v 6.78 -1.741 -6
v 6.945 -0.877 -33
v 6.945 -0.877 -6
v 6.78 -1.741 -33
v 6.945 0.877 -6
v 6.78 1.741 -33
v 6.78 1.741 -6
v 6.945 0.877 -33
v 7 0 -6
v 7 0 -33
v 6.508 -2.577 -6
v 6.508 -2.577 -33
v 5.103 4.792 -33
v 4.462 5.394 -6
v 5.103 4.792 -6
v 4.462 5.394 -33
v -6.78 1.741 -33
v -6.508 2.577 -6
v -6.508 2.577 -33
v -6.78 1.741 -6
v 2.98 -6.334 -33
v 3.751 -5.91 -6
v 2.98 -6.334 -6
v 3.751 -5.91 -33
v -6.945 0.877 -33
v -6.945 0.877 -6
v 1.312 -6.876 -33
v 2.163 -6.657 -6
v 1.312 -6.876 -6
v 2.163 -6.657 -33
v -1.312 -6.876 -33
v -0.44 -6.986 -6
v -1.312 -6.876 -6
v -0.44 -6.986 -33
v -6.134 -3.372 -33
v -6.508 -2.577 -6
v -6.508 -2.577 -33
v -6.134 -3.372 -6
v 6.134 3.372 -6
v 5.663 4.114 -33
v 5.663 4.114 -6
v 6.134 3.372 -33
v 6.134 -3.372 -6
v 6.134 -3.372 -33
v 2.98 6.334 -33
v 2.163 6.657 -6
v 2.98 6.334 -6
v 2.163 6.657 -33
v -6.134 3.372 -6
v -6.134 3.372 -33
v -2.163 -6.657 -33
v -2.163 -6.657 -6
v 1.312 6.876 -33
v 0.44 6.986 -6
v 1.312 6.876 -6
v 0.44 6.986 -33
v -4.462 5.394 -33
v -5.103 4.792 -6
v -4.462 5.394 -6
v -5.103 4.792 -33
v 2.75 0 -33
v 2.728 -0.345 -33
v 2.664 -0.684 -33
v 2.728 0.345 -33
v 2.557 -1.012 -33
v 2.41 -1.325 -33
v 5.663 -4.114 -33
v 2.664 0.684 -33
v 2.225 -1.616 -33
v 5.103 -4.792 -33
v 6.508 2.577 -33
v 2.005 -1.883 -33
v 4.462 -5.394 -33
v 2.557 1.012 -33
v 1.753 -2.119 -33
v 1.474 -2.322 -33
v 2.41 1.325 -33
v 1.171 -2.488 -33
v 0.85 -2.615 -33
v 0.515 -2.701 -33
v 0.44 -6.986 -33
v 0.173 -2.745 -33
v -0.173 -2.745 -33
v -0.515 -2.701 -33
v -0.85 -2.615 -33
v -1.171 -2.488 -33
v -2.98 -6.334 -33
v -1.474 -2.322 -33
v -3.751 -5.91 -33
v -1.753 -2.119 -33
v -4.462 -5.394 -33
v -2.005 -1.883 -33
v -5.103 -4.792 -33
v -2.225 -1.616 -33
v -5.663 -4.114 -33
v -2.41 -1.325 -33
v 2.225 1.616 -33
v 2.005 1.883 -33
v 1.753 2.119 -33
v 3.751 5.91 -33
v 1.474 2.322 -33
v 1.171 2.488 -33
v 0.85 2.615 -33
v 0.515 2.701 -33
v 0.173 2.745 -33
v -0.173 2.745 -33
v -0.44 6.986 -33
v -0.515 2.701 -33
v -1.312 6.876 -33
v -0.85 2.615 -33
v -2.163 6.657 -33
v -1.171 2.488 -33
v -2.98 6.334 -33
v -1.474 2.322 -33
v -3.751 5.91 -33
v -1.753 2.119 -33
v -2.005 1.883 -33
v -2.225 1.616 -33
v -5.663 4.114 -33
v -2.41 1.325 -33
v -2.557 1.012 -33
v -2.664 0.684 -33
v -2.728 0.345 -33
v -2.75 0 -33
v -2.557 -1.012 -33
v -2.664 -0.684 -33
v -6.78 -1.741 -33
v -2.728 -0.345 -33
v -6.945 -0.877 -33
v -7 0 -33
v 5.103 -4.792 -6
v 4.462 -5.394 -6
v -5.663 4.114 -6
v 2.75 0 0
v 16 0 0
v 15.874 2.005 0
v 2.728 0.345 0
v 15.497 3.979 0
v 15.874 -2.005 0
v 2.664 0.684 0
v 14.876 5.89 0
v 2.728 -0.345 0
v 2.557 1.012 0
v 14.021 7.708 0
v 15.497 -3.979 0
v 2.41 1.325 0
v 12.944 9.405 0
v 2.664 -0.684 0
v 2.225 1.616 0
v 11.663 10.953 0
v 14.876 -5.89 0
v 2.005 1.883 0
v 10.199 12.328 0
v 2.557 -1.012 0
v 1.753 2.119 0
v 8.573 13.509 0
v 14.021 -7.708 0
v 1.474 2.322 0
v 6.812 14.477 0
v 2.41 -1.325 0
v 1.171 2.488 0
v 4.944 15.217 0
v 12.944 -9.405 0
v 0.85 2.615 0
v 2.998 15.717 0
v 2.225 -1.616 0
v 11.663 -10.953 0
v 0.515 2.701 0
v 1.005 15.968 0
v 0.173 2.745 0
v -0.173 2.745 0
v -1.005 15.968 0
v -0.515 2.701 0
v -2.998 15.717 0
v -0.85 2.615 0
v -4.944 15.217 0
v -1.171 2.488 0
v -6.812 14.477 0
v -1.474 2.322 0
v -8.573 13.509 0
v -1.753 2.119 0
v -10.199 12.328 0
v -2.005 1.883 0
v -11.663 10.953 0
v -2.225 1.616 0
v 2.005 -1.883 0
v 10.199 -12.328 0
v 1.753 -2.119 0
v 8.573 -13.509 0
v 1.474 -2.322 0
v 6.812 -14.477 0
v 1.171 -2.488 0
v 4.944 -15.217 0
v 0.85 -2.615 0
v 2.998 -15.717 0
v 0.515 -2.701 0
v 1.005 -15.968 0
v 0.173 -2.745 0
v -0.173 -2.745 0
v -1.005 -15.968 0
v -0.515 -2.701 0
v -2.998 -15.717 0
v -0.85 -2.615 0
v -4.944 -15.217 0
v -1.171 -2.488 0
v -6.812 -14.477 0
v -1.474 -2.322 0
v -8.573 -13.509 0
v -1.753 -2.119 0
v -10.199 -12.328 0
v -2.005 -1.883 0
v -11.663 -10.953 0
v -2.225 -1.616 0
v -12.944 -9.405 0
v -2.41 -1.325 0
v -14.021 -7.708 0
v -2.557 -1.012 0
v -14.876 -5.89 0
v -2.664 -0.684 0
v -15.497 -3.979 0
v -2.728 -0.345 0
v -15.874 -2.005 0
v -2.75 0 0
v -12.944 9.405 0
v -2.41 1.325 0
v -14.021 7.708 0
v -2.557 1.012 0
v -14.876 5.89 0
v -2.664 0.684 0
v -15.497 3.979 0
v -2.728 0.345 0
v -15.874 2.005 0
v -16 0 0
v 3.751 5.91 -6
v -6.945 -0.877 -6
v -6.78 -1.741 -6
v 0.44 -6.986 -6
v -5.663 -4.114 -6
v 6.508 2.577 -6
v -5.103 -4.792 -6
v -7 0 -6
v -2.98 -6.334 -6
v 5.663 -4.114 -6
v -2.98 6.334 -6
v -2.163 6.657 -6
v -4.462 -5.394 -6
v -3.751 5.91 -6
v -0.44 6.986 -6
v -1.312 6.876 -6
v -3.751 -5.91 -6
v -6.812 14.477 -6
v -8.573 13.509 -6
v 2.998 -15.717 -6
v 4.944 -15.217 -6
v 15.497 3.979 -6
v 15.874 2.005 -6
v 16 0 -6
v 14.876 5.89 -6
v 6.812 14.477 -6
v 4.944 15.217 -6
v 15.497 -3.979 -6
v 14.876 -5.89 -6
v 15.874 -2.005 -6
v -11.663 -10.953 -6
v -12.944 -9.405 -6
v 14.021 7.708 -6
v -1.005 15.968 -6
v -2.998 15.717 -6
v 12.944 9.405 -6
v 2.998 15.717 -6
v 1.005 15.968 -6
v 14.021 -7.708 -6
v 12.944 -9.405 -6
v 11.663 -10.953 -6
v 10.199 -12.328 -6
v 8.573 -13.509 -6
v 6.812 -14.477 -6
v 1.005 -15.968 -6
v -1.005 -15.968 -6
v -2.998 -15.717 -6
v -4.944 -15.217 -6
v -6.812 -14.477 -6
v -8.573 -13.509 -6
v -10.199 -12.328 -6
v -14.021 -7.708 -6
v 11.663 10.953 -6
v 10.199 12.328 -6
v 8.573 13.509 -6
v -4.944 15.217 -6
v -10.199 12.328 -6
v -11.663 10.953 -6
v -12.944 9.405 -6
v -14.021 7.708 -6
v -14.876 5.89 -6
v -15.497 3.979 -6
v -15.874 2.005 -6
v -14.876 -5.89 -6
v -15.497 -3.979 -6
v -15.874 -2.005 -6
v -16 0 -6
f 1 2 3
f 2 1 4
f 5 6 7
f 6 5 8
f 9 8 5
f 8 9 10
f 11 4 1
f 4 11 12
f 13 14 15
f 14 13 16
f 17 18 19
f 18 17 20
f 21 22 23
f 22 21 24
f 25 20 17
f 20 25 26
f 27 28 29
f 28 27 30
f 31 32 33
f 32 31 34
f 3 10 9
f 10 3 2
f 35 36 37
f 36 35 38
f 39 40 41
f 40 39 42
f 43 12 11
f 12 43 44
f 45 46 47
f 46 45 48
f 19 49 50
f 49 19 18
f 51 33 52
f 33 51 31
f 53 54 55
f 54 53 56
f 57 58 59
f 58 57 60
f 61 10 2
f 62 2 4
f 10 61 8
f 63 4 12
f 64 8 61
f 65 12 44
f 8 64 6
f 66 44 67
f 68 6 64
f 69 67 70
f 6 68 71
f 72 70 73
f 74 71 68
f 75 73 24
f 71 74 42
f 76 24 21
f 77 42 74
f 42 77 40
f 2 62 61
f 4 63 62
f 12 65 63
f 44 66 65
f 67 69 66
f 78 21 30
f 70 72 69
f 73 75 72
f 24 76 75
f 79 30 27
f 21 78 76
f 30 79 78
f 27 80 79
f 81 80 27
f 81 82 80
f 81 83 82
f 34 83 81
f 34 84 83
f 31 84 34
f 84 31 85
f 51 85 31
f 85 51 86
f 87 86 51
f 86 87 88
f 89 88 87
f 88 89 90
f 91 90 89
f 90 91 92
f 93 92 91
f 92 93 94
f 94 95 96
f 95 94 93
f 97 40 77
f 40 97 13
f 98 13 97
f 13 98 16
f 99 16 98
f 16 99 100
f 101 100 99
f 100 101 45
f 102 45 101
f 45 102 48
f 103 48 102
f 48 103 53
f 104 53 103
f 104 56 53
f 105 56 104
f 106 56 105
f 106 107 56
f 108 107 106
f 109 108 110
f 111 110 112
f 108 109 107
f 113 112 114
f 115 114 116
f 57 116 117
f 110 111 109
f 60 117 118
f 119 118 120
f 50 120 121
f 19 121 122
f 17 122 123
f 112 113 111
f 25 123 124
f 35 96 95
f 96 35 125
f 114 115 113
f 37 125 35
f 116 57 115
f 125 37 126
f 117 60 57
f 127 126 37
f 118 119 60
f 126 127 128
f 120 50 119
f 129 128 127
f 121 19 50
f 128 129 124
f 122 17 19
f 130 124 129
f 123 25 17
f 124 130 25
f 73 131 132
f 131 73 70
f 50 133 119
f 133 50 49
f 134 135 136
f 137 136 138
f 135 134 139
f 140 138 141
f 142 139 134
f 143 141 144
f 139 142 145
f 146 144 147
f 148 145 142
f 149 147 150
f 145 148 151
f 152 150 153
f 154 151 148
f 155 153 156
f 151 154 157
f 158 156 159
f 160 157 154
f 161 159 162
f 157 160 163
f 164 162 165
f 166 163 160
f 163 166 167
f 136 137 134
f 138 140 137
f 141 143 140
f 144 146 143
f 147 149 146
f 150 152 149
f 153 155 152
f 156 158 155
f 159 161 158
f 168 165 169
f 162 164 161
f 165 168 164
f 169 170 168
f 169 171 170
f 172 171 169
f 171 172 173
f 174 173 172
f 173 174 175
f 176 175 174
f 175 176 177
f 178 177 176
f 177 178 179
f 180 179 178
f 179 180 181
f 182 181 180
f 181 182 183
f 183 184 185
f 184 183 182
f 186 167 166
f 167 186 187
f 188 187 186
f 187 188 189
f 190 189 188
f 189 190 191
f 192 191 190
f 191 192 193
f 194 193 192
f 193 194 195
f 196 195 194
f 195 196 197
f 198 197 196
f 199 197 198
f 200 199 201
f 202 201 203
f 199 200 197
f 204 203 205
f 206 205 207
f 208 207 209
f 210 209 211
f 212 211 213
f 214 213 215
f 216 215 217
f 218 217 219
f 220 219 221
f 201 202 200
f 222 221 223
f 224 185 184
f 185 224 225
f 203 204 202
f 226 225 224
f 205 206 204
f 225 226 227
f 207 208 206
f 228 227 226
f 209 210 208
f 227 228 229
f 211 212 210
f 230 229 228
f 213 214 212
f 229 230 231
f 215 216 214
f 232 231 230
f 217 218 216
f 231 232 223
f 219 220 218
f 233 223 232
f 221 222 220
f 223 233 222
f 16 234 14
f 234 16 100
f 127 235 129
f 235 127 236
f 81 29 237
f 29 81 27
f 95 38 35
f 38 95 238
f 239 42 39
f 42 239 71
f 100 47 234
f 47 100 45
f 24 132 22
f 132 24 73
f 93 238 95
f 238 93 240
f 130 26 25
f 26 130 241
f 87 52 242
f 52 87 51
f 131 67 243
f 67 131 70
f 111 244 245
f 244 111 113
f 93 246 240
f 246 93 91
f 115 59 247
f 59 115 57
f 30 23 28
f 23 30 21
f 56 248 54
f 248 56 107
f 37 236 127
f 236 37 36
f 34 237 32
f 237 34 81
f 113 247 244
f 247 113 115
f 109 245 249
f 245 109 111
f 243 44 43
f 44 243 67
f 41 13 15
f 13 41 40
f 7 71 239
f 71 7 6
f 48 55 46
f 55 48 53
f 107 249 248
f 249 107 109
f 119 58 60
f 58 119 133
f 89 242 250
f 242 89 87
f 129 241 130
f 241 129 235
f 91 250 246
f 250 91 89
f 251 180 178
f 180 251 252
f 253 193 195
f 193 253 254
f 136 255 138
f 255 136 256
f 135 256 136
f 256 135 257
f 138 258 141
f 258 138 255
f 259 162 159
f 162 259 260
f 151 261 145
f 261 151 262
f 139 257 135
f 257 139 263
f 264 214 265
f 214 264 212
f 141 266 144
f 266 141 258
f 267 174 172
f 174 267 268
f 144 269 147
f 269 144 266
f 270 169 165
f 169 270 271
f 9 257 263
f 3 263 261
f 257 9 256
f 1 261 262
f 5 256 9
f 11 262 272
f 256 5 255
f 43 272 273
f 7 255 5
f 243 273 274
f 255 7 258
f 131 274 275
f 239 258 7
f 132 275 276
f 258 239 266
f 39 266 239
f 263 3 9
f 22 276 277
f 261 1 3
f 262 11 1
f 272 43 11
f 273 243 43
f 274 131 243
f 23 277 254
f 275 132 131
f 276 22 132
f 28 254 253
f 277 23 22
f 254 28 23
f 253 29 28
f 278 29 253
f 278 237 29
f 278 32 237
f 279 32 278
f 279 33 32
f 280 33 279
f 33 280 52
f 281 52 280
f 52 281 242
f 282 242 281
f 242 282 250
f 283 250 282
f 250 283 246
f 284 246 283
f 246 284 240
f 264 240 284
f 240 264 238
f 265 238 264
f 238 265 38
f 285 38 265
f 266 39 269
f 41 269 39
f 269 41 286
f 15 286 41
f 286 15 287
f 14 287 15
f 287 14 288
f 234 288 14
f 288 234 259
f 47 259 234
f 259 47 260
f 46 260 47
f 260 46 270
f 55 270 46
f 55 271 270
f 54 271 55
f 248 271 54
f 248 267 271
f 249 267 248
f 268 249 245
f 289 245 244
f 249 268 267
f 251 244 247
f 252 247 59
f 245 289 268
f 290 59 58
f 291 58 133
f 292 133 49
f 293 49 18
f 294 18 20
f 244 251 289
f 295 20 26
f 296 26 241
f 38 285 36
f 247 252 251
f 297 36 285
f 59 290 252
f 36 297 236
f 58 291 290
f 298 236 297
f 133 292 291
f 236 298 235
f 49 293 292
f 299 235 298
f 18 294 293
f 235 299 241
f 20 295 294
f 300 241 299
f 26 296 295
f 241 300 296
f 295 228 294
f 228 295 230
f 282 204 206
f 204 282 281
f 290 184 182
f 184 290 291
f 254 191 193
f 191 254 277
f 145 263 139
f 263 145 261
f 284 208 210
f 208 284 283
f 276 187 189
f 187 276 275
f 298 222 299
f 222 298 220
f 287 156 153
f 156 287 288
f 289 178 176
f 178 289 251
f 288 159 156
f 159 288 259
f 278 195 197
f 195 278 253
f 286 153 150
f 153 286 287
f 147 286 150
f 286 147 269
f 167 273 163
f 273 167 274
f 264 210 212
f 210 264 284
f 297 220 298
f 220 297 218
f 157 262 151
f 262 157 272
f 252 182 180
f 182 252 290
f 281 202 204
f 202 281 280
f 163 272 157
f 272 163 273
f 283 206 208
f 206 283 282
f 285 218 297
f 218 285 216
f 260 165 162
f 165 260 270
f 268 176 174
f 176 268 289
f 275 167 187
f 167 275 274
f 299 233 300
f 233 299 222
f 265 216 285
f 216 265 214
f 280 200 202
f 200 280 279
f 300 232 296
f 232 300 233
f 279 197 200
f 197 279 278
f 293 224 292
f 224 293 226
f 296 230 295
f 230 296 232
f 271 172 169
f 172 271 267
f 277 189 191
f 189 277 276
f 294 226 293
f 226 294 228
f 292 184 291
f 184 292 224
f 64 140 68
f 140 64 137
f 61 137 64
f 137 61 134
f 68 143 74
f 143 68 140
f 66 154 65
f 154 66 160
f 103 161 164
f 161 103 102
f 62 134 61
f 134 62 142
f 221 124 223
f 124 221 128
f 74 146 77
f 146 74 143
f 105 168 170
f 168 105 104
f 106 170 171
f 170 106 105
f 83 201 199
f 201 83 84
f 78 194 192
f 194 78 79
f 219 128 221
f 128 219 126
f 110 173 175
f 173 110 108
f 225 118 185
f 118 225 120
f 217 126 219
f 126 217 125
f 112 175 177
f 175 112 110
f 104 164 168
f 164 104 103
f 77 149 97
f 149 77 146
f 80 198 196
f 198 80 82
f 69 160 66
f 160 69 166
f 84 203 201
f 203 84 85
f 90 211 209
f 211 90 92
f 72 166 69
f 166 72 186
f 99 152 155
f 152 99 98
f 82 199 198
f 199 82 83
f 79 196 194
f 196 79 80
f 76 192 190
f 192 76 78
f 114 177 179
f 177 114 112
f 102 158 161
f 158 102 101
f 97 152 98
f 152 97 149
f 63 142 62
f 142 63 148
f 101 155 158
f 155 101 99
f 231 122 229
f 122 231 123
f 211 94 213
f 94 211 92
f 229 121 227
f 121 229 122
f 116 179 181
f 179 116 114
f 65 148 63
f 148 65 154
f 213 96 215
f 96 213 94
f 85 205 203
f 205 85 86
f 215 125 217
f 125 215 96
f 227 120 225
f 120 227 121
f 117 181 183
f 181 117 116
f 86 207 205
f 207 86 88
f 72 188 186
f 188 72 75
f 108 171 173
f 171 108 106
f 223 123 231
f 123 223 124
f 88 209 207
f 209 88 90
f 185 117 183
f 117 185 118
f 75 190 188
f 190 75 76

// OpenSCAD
$fn = 50;


difference() {
	union() {
		translate(v = [0, 0, -33.0000000000]) {
			cylinder(h = 33, r = 7.0000000000);
		}
		translate(v = [0, 0, -6.0000000000]) {
			cylinder(h = 6, r = 16.0000000000);
		}
	}
	union() {
		#translate(v = [0, 0, -33]) {
			cylinder(h = 33, r = 2.7500000000);
		}
	}
}
